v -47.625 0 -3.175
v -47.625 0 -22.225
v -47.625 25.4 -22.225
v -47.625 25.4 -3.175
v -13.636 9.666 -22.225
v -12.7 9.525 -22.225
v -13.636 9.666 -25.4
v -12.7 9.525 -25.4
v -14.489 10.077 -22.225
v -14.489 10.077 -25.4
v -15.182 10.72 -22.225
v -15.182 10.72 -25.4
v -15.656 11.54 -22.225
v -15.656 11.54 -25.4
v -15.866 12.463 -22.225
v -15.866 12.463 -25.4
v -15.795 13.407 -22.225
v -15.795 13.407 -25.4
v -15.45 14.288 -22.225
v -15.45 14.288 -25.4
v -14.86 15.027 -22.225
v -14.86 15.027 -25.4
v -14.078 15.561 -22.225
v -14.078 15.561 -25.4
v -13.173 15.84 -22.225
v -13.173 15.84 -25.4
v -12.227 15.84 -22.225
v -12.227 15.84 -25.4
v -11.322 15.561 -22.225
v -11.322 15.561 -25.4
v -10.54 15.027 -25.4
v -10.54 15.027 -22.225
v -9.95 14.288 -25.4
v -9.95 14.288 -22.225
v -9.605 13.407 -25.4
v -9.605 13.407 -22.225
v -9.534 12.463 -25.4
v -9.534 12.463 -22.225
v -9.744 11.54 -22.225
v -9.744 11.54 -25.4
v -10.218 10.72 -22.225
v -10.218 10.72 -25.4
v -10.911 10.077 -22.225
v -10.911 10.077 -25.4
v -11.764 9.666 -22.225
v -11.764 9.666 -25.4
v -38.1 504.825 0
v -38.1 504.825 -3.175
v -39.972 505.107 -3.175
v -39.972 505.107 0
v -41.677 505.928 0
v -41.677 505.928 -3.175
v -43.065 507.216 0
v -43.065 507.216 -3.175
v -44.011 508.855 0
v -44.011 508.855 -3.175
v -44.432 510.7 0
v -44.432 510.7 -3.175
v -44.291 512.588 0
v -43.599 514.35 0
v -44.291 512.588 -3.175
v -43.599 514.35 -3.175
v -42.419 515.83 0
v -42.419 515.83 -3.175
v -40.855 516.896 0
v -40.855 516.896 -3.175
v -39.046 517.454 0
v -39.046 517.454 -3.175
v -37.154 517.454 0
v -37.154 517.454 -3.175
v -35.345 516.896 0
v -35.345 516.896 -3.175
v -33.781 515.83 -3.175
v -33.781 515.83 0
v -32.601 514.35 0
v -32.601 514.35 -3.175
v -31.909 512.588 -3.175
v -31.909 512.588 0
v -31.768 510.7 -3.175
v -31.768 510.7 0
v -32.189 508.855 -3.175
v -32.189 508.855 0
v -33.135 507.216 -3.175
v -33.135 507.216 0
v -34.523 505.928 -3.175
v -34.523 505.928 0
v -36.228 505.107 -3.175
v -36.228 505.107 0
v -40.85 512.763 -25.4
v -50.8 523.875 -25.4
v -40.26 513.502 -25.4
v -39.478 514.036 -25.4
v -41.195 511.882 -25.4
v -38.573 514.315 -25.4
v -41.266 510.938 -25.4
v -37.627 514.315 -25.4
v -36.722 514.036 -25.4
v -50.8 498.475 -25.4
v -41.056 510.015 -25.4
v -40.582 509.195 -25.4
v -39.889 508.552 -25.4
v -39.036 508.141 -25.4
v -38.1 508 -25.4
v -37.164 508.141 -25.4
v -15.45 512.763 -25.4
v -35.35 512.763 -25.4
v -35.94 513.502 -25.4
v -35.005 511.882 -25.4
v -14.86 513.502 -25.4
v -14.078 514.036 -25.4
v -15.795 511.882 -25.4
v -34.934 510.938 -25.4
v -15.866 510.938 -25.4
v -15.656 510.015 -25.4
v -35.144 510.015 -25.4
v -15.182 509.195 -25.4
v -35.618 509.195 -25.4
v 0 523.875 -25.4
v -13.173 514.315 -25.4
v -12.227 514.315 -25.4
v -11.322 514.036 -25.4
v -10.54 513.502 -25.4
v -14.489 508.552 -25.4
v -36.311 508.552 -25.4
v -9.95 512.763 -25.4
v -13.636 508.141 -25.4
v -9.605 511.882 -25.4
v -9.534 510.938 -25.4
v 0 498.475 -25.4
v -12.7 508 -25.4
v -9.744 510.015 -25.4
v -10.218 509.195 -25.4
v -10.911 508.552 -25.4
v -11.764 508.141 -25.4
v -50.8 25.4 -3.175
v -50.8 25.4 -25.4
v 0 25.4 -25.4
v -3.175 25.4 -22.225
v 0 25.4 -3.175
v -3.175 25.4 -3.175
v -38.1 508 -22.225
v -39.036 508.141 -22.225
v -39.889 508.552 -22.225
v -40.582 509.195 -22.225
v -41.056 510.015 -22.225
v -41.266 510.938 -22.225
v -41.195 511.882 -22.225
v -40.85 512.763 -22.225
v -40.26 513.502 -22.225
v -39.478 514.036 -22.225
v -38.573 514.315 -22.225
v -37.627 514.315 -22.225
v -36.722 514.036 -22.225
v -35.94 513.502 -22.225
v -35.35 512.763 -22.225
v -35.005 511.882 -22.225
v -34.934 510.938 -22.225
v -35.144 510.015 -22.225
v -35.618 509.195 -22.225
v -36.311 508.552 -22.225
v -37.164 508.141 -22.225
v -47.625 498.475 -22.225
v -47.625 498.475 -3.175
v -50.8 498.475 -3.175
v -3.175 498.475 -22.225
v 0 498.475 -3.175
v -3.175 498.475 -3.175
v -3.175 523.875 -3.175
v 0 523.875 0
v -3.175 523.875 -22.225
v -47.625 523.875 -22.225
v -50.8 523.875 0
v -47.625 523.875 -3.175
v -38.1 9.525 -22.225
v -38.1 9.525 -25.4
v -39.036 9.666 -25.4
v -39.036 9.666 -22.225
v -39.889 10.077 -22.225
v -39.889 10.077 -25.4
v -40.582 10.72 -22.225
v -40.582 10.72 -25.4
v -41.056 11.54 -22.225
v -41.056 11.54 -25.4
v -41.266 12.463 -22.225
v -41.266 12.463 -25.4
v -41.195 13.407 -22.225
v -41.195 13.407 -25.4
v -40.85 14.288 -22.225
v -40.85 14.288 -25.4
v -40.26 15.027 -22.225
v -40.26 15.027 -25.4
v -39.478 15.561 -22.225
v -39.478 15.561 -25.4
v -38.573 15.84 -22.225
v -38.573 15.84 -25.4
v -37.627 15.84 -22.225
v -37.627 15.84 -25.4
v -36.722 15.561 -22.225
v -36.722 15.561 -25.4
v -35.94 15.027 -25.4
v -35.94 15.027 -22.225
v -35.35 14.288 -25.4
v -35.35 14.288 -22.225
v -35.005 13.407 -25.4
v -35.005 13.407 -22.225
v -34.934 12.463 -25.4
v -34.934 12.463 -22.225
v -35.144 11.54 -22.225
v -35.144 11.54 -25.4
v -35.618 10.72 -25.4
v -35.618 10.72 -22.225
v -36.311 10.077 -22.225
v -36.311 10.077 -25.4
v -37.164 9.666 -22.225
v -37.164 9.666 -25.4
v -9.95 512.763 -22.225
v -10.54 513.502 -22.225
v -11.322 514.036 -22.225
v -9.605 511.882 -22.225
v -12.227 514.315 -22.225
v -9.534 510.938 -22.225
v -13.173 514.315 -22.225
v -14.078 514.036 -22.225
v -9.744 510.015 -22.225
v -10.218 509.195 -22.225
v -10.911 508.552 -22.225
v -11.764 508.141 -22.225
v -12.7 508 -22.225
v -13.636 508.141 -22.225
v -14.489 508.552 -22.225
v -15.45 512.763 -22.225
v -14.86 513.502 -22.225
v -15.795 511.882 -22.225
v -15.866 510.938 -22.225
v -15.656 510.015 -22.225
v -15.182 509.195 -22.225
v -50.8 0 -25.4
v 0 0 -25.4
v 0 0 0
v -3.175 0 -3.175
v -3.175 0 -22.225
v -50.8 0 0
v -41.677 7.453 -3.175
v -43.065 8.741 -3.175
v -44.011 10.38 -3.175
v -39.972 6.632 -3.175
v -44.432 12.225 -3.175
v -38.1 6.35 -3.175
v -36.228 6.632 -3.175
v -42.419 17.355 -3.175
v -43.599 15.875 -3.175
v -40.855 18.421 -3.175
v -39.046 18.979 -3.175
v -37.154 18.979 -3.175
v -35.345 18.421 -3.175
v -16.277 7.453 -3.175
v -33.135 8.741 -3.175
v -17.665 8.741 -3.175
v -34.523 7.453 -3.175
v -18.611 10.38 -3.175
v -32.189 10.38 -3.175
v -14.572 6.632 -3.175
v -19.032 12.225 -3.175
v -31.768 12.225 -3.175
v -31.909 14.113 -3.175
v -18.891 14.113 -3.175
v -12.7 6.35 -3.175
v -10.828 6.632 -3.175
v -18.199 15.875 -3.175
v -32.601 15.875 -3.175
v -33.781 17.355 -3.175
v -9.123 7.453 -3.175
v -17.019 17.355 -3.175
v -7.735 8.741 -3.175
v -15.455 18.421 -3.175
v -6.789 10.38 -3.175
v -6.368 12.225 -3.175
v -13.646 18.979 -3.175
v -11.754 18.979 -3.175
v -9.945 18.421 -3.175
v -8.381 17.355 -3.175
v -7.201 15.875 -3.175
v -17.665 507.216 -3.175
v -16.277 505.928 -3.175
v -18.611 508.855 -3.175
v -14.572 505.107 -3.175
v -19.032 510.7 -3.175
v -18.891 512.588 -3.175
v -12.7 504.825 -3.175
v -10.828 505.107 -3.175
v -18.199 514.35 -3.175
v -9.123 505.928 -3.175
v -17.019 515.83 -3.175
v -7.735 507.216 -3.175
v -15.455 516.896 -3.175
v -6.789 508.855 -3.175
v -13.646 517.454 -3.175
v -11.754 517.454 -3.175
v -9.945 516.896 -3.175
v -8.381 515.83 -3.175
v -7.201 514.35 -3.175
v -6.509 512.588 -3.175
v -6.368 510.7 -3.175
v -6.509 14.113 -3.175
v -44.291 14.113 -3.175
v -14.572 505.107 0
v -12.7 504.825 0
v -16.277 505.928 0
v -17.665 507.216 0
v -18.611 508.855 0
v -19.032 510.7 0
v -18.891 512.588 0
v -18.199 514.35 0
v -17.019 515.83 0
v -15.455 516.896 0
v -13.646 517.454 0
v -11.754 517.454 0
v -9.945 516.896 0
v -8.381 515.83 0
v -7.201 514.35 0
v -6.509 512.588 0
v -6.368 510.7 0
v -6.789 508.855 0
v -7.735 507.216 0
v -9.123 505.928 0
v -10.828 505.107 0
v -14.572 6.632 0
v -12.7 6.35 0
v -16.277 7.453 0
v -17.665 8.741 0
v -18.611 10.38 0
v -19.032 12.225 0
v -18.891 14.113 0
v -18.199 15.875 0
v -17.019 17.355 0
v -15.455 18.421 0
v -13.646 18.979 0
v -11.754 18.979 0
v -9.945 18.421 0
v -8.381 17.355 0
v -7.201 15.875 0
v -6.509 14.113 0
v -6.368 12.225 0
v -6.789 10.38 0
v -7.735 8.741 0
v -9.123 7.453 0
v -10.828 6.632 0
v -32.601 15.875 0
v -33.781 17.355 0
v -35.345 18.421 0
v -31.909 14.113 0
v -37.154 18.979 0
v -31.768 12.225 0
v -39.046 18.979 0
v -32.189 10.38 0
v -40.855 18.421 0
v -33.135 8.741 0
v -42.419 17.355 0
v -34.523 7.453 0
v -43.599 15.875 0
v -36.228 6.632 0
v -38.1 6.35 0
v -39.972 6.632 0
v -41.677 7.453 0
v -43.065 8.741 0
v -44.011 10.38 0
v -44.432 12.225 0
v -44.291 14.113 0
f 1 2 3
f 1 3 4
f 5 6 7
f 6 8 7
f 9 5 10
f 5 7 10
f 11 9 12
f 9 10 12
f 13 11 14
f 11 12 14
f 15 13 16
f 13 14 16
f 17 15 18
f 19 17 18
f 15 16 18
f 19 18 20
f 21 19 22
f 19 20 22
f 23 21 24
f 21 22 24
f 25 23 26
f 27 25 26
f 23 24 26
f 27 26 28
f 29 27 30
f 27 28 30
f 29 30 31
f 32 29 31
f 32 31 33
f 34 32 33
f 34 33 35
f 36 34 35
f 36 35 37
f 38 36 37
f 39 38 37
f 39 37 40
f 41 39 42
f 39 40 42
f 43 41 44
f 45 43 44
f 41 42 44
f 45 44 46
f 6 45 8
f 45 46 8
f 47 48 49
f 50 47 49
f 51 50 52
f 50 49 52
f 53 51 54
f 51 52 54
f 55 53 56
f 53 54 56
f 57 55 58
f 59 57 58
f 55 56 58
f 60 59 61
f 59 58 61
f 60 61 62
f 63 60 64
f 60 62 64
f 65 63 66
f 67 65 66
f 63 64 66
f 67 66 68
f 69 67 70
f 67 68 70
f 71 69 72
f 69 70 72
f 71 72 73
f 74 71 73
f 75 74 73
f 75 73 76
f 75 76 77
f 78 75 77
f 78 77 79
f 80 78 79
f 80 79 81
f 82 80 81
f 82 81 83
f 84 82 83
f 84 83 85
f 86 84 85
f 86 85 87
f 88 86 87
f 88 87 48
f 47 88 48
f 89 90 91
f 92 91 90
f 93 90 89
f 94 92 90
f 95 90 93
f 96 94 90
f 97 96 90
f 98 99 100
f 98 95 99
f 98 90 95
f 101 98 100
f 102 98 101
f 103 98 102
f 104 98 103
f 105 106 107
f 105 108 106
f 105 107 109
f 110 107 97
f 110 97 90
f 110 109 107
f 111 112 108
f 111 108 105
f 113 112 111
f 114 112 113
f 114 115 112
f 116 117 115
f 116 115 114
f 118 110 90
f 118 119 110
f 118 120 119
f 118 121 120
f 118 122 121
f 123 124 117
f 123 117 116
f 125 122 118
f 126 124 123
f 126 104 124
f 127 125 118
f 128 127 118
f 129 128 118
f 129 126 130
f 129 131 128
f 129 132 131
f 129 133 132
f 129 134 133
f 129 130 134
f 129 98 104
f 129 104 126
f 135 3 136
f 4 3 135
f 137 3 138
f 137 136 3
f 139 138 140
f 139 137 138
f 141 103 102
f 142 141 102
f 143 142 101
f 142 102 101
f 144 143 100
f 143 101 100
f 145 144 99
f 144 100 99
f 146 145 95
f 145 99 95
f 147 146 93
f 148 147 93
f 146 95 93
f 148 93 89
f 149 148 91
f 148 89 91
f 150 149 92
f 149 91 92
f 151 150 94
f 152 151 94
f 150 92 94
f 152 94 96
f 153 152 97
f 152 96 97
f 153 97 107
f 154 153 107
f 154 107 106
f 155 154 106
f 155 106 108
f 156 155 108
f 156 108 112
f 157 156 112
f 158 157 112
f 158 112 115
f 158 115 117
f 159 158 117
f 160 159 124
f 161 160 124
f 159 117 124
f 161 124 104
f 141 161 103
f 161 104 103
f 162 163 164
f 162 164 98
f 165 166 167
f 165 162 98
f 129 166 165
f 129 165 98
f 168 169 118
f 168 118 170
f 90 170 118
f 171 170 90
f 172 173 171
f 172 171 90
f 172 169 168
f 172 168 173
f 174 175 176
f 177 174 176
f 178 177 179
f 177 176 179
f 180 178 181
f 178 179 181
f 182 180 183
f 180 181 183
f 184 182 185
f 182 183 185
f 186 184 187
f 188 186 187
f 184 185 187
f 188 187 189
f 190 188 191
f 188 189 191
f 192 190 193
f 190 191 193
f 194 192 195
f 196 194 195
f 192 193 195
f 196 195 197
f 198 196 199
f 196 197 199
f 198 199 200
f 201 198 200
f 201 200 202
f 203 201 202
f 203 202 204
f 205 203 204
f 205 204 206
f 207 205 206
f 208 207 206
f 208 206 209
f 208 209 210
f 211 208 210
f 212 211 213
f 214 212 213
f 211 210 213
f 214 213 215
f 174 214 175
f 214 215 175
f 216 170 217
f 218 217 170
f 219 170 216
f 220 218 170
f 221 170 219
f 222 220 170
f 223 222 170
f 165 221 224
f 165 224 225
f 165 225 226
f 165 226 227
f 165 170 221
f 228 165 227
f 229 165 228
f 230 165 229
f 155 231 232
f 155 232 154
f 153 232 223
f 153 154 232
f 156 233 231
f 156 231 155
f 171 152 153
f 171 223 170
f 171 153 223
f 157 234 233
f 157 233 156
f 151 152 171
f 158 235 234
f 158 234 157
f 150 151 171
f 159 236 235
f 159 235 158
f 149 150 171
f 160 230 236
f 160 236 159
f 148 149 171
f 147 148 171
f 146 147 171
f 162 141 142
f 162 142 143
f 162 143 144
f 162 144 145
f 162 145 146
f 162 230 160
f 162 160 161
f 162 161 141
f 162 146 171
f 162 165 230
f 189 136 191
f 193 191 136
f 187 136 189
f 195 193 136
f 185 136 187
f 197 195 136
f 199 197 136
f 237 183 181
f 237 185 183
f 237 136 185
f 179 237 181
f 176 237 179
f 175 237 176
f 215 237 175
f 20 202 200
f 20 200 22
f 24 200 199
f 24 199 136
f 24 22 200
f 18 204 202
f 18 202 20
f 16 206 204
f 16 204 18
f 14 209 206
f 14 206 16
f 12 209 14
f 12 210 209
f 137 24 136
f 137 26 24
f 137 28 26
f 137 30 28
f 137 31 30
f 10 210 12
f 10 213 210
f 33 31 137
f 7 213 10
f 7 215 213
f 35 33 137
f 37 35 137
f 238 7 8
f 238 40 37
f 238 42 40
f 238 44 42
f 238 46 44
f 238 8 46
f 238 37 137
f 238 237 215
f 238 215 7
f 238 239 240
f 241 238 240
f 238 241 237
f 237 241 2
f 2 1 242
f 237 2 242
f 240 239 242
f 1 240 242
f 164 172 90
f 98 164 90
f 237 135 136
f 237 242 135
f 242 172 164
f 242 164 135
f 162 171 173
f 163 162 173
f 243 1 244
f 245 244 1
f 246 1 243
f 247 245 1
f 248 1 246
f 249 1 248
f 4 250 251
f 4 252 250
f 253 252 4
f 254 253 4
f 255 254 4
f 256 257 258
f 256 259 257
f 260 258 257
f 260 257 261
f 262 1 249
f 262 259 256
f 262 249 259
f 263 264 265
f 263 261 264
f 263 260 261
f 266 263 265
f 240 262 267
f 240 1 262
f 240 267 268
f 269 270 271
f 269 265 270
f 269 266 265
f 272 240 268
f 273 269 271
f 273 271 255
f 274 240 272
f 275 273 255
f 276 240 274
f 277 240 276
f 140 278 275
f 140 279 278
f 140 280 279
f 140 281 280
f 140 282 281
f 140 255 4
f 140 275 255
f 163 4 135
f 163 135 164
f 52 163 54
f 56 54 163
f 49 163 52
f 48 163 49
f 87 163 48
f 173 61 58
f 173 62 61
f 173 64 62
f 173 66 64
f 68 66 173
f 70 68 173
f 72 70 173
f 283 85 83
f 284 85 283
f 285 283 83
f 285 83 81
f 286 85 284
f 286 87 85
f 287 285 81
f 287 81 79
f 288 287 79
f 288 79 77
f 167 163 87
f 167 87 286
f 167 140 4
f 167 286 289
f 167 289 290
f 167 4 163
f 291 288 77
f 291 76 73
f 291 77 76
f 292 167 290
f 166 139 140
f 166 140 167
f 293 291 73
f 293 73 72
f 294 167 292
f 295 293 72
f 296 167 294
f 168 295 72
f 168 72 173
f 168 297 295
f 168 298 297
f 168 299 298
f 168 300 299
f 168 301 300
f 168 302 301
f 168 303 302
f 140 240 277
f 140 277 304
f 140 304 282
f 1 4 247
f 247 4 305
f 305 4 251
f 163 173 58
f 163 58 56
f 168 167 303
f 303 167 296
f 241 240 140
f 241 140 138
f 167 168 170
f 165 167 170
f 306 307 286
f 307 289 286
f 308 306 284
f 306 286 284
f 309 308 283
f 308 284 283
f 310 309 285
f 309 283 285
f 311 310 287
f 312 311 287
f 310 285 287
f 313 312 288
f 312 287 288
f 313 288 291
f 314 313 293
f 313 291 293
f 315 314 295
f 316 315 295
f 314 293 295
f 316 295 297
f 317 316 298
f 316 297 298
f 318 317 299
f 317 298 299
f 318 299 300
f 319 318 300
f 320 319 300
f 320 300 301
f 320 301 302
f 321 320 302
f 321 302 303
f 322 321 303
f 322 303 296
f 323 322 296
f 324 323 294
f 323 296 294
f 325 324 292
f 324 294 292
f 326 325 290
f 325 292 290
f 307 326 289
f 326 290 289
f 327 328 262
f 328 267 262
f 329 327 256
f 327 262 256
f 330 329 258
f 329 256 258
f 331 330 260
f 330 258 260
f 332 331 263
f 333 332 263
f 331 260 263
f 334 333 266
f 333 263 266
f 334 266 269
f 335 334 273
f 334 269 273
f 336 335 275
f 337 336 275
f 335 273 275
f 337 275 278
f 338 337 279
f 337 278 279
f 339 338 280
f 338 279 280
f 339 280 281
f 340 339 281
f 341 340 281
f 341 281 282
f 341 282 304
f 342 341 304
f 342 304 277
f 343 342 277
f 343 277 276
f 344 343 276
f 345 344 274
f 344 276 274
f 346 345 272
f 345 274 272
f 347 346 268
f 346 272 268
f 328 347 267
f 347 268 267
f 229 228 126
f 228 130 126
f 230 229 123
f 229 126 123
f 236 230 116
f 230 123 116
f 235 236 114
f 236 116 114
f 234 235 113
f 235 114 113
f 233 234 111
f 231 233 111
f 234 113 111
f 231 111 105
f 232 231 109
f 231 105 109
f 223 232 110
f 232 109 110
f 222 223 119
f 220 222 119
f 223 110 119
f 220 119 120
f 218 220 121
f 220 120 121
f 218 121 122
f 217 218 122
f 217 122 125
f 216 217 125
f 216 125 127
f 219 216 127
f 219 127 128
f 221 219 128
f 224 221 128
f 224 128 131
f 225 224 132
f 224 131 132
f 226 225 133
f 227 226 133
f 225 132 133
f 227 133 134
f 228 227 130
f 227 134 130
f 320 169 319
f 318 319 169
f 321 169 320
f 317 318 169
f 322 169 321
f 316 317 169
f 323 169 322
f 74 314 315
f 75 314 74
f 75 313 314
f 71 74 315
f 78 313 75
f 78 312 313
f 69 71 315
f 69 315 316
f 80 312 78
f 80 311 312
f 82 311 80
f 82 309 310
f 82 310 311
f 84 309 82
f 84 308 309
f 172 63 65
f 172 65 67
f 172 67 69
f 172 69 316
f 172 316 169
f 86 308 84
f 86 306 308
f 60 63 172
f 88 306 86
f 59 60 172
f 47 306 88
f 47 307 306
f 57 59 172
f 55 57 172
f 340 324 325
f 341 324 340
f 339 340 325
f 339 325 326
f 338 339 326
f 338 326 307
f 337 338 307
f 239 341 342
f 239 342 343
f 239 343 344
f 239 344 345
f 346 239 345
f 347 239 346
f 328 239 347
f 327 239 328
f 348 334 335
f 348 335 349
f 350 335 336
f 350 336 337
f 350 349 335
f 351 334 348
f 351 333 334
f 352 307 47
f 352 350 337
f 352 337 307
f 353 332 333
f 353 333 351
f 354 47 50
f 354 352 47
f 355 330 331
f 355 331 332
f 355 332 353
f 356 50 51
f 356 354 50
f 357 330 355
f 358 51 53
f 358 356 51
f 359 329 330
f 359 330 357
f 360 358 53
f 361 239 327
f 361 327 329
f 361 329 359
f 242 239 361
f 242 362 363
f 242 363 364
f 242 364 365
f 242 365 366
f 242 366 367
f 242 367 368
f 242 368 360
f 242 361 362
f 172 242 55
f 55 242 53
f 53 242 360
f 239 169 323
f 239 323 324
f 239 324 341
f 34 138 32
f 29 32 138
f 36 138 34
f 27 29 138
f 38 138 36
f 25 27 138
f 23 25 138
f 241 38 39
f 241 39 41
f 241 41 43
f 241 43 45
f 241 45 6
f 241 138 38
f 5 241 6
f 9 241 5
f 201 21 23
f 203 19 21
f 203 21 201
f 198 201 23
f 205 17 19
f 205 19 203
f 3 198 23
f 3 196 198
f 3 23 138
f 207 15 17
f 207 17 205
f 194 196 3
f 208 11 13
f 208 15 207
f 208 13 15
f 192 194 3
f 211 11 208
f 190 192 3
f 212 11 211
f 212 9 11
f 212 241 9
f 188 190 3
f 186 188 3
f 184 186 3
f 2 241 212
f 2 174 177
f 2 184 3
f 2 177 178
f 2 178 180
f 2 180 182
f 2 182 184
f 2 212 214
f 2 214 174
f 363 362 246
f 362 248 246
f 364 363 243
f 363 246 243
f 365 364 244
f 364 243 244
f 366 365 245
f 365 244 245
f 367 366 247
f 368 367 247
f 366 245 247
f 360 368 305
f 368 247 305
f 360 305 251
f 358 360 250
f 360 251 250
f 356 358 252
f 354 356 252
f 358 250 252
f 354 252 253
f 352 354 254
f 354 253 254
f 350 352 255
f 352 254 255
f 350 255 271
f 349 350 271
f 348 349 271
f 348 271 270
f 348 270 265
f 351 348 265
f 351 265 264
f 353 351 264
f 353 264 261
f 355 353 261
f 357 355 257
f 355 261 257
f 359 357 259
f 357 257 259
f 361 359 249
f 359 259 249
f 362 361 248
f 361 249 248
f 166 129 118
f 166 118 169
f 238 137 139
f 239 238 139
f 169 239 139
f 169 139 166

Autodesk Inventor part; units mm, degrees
ref_plane "YZ Plane" through (0, 0, 0) normal (1, 0, 0) x (0, 1, 0)
ref_plane "XZ Plane" through (0, 0, 0) normal (0, 1, 0) x (-1, 0, 0)
ref_plane "XY Plane" through (0, 0, 0) normal (0, 0, 1) x (1, 0, 0)
sketch "Sketch1" plane through (0, 0, 0) normal (0, 1, 0) x (-1, 0, 0)
  line L0 (0, 0) -> (50.8, 0)
  line L1 (50.8, 0) -> (50.8, -25.4)
  line L2 (50.8, -25.4) -> (0, -25.4)
  line L3 (0, -25.4) -> (0, 0)
  line L4 (47.625, -3.175) -> (3.175, -3.175)
  line L5 (3.175, -3.175) -> (3.175, -22.225)
  line L6 (3.175, -22.225) -> (47.625, -22.225)
  line L7 (47.625, -22.225) -> (47.625, -3.175)
  dimension "d0" = 50.8
  dimension "d1" = 25.4
  dimension "d2" = 3.175
extrude "Extrusion1" add sketch "Sketch1" along normal blind 523.875
sketch "Sketch2" plane through (0, 0, 0) normal (1, 0, 0) x (0, 0, -1)
  line L0 (25.4, 0) -> (0, 0) projected
  line L1 (25.4, 0) -> (25.4, 523.875) projected
  line L2 (0, 523.875) -> (25.4, 523.875) projected
  line L3 (0, 0) -> (0, 523.875) projected
  line L4 (3.175, 0) -> (3.175, 523.875) projected
  line L5 (25.4, 0) -> (25.4, 523.875) projected
  line L6 (3.175, 498.475) -> (25.4, 498.475)
  line L7 (25.4, 498.475) -> (25.4, 25.4)
  line L8 (25.4, 25.4) -> (3.175, 25.4)
  line L9 (3.175, 25.4) -> (3.175, 498.475)
  dimension "d5" = 25.4
  dimension "d6" = 25.4
extrude "Extrusion2" cut sketch "Sketch2" against normal blind 663.575 contours L8 L4 L6 L1
sketch "Sketch3" plane through (-50.8, 0, 0) normal (0, 0, 1) x (1, 0, 0)
  line L0 (50.8, 0) -> (0, 0) projected
  line L1 (50.8, 0) -> (50.8, 523.875) projected
  line L2 (0, 523.875) -> (50.8, 523.875) projected
  line L3 (0, 0) -> (0, 523.875) projected
  line L4 (47.625, 25.4) -> (3.175, 25.4) projected
  line L5 (3.175, 0) -> (3.175, 25.4) projected
  line L6 (47.625, 0) -> (3.175, 0) projected
  line L7 (47.625, 0) -> (47.625, 25.4) projected
  line L8 (3.175, 498.475) -> (47.625, 498.475) projected
  line L9 (47.625, 498.475) -> (47.625, 523.875) projected
  line L10 (3.175, 523.875) -> (47.625, 523.875) projected
  line L11 (3.175, 498.475) -> (3.175, 523.875) projected
  point P0 (12.7, 12.7)
  point P1 (38.1, 12.7)
  point P2 (12.7, 511.175)
  point P3 (38.1, 511.175)
  dimension "d9" = 12.7
  dimension "d10" = 12.7
  dimension "d11" = 12.7
  dimension "d12" = 12.7
  dimension "d13" = 12.7
  dimension "d14" = 12.7
  dimension "d15" = 12.7
  dimension "d16" = 12.7
hole "Hole1" at (-38.1, 12.7, 0) at (-12.7, 12.7, 0) at (-38.1, 511.175, 0) at (-12.7, 511.175, 0) direction (0, 0, -1) diameter 6.35 end through all counterbore diameter 12.7 counterbore depth 6.35
properties part number "OverheadSupportBar.ver1-1111-2020"
